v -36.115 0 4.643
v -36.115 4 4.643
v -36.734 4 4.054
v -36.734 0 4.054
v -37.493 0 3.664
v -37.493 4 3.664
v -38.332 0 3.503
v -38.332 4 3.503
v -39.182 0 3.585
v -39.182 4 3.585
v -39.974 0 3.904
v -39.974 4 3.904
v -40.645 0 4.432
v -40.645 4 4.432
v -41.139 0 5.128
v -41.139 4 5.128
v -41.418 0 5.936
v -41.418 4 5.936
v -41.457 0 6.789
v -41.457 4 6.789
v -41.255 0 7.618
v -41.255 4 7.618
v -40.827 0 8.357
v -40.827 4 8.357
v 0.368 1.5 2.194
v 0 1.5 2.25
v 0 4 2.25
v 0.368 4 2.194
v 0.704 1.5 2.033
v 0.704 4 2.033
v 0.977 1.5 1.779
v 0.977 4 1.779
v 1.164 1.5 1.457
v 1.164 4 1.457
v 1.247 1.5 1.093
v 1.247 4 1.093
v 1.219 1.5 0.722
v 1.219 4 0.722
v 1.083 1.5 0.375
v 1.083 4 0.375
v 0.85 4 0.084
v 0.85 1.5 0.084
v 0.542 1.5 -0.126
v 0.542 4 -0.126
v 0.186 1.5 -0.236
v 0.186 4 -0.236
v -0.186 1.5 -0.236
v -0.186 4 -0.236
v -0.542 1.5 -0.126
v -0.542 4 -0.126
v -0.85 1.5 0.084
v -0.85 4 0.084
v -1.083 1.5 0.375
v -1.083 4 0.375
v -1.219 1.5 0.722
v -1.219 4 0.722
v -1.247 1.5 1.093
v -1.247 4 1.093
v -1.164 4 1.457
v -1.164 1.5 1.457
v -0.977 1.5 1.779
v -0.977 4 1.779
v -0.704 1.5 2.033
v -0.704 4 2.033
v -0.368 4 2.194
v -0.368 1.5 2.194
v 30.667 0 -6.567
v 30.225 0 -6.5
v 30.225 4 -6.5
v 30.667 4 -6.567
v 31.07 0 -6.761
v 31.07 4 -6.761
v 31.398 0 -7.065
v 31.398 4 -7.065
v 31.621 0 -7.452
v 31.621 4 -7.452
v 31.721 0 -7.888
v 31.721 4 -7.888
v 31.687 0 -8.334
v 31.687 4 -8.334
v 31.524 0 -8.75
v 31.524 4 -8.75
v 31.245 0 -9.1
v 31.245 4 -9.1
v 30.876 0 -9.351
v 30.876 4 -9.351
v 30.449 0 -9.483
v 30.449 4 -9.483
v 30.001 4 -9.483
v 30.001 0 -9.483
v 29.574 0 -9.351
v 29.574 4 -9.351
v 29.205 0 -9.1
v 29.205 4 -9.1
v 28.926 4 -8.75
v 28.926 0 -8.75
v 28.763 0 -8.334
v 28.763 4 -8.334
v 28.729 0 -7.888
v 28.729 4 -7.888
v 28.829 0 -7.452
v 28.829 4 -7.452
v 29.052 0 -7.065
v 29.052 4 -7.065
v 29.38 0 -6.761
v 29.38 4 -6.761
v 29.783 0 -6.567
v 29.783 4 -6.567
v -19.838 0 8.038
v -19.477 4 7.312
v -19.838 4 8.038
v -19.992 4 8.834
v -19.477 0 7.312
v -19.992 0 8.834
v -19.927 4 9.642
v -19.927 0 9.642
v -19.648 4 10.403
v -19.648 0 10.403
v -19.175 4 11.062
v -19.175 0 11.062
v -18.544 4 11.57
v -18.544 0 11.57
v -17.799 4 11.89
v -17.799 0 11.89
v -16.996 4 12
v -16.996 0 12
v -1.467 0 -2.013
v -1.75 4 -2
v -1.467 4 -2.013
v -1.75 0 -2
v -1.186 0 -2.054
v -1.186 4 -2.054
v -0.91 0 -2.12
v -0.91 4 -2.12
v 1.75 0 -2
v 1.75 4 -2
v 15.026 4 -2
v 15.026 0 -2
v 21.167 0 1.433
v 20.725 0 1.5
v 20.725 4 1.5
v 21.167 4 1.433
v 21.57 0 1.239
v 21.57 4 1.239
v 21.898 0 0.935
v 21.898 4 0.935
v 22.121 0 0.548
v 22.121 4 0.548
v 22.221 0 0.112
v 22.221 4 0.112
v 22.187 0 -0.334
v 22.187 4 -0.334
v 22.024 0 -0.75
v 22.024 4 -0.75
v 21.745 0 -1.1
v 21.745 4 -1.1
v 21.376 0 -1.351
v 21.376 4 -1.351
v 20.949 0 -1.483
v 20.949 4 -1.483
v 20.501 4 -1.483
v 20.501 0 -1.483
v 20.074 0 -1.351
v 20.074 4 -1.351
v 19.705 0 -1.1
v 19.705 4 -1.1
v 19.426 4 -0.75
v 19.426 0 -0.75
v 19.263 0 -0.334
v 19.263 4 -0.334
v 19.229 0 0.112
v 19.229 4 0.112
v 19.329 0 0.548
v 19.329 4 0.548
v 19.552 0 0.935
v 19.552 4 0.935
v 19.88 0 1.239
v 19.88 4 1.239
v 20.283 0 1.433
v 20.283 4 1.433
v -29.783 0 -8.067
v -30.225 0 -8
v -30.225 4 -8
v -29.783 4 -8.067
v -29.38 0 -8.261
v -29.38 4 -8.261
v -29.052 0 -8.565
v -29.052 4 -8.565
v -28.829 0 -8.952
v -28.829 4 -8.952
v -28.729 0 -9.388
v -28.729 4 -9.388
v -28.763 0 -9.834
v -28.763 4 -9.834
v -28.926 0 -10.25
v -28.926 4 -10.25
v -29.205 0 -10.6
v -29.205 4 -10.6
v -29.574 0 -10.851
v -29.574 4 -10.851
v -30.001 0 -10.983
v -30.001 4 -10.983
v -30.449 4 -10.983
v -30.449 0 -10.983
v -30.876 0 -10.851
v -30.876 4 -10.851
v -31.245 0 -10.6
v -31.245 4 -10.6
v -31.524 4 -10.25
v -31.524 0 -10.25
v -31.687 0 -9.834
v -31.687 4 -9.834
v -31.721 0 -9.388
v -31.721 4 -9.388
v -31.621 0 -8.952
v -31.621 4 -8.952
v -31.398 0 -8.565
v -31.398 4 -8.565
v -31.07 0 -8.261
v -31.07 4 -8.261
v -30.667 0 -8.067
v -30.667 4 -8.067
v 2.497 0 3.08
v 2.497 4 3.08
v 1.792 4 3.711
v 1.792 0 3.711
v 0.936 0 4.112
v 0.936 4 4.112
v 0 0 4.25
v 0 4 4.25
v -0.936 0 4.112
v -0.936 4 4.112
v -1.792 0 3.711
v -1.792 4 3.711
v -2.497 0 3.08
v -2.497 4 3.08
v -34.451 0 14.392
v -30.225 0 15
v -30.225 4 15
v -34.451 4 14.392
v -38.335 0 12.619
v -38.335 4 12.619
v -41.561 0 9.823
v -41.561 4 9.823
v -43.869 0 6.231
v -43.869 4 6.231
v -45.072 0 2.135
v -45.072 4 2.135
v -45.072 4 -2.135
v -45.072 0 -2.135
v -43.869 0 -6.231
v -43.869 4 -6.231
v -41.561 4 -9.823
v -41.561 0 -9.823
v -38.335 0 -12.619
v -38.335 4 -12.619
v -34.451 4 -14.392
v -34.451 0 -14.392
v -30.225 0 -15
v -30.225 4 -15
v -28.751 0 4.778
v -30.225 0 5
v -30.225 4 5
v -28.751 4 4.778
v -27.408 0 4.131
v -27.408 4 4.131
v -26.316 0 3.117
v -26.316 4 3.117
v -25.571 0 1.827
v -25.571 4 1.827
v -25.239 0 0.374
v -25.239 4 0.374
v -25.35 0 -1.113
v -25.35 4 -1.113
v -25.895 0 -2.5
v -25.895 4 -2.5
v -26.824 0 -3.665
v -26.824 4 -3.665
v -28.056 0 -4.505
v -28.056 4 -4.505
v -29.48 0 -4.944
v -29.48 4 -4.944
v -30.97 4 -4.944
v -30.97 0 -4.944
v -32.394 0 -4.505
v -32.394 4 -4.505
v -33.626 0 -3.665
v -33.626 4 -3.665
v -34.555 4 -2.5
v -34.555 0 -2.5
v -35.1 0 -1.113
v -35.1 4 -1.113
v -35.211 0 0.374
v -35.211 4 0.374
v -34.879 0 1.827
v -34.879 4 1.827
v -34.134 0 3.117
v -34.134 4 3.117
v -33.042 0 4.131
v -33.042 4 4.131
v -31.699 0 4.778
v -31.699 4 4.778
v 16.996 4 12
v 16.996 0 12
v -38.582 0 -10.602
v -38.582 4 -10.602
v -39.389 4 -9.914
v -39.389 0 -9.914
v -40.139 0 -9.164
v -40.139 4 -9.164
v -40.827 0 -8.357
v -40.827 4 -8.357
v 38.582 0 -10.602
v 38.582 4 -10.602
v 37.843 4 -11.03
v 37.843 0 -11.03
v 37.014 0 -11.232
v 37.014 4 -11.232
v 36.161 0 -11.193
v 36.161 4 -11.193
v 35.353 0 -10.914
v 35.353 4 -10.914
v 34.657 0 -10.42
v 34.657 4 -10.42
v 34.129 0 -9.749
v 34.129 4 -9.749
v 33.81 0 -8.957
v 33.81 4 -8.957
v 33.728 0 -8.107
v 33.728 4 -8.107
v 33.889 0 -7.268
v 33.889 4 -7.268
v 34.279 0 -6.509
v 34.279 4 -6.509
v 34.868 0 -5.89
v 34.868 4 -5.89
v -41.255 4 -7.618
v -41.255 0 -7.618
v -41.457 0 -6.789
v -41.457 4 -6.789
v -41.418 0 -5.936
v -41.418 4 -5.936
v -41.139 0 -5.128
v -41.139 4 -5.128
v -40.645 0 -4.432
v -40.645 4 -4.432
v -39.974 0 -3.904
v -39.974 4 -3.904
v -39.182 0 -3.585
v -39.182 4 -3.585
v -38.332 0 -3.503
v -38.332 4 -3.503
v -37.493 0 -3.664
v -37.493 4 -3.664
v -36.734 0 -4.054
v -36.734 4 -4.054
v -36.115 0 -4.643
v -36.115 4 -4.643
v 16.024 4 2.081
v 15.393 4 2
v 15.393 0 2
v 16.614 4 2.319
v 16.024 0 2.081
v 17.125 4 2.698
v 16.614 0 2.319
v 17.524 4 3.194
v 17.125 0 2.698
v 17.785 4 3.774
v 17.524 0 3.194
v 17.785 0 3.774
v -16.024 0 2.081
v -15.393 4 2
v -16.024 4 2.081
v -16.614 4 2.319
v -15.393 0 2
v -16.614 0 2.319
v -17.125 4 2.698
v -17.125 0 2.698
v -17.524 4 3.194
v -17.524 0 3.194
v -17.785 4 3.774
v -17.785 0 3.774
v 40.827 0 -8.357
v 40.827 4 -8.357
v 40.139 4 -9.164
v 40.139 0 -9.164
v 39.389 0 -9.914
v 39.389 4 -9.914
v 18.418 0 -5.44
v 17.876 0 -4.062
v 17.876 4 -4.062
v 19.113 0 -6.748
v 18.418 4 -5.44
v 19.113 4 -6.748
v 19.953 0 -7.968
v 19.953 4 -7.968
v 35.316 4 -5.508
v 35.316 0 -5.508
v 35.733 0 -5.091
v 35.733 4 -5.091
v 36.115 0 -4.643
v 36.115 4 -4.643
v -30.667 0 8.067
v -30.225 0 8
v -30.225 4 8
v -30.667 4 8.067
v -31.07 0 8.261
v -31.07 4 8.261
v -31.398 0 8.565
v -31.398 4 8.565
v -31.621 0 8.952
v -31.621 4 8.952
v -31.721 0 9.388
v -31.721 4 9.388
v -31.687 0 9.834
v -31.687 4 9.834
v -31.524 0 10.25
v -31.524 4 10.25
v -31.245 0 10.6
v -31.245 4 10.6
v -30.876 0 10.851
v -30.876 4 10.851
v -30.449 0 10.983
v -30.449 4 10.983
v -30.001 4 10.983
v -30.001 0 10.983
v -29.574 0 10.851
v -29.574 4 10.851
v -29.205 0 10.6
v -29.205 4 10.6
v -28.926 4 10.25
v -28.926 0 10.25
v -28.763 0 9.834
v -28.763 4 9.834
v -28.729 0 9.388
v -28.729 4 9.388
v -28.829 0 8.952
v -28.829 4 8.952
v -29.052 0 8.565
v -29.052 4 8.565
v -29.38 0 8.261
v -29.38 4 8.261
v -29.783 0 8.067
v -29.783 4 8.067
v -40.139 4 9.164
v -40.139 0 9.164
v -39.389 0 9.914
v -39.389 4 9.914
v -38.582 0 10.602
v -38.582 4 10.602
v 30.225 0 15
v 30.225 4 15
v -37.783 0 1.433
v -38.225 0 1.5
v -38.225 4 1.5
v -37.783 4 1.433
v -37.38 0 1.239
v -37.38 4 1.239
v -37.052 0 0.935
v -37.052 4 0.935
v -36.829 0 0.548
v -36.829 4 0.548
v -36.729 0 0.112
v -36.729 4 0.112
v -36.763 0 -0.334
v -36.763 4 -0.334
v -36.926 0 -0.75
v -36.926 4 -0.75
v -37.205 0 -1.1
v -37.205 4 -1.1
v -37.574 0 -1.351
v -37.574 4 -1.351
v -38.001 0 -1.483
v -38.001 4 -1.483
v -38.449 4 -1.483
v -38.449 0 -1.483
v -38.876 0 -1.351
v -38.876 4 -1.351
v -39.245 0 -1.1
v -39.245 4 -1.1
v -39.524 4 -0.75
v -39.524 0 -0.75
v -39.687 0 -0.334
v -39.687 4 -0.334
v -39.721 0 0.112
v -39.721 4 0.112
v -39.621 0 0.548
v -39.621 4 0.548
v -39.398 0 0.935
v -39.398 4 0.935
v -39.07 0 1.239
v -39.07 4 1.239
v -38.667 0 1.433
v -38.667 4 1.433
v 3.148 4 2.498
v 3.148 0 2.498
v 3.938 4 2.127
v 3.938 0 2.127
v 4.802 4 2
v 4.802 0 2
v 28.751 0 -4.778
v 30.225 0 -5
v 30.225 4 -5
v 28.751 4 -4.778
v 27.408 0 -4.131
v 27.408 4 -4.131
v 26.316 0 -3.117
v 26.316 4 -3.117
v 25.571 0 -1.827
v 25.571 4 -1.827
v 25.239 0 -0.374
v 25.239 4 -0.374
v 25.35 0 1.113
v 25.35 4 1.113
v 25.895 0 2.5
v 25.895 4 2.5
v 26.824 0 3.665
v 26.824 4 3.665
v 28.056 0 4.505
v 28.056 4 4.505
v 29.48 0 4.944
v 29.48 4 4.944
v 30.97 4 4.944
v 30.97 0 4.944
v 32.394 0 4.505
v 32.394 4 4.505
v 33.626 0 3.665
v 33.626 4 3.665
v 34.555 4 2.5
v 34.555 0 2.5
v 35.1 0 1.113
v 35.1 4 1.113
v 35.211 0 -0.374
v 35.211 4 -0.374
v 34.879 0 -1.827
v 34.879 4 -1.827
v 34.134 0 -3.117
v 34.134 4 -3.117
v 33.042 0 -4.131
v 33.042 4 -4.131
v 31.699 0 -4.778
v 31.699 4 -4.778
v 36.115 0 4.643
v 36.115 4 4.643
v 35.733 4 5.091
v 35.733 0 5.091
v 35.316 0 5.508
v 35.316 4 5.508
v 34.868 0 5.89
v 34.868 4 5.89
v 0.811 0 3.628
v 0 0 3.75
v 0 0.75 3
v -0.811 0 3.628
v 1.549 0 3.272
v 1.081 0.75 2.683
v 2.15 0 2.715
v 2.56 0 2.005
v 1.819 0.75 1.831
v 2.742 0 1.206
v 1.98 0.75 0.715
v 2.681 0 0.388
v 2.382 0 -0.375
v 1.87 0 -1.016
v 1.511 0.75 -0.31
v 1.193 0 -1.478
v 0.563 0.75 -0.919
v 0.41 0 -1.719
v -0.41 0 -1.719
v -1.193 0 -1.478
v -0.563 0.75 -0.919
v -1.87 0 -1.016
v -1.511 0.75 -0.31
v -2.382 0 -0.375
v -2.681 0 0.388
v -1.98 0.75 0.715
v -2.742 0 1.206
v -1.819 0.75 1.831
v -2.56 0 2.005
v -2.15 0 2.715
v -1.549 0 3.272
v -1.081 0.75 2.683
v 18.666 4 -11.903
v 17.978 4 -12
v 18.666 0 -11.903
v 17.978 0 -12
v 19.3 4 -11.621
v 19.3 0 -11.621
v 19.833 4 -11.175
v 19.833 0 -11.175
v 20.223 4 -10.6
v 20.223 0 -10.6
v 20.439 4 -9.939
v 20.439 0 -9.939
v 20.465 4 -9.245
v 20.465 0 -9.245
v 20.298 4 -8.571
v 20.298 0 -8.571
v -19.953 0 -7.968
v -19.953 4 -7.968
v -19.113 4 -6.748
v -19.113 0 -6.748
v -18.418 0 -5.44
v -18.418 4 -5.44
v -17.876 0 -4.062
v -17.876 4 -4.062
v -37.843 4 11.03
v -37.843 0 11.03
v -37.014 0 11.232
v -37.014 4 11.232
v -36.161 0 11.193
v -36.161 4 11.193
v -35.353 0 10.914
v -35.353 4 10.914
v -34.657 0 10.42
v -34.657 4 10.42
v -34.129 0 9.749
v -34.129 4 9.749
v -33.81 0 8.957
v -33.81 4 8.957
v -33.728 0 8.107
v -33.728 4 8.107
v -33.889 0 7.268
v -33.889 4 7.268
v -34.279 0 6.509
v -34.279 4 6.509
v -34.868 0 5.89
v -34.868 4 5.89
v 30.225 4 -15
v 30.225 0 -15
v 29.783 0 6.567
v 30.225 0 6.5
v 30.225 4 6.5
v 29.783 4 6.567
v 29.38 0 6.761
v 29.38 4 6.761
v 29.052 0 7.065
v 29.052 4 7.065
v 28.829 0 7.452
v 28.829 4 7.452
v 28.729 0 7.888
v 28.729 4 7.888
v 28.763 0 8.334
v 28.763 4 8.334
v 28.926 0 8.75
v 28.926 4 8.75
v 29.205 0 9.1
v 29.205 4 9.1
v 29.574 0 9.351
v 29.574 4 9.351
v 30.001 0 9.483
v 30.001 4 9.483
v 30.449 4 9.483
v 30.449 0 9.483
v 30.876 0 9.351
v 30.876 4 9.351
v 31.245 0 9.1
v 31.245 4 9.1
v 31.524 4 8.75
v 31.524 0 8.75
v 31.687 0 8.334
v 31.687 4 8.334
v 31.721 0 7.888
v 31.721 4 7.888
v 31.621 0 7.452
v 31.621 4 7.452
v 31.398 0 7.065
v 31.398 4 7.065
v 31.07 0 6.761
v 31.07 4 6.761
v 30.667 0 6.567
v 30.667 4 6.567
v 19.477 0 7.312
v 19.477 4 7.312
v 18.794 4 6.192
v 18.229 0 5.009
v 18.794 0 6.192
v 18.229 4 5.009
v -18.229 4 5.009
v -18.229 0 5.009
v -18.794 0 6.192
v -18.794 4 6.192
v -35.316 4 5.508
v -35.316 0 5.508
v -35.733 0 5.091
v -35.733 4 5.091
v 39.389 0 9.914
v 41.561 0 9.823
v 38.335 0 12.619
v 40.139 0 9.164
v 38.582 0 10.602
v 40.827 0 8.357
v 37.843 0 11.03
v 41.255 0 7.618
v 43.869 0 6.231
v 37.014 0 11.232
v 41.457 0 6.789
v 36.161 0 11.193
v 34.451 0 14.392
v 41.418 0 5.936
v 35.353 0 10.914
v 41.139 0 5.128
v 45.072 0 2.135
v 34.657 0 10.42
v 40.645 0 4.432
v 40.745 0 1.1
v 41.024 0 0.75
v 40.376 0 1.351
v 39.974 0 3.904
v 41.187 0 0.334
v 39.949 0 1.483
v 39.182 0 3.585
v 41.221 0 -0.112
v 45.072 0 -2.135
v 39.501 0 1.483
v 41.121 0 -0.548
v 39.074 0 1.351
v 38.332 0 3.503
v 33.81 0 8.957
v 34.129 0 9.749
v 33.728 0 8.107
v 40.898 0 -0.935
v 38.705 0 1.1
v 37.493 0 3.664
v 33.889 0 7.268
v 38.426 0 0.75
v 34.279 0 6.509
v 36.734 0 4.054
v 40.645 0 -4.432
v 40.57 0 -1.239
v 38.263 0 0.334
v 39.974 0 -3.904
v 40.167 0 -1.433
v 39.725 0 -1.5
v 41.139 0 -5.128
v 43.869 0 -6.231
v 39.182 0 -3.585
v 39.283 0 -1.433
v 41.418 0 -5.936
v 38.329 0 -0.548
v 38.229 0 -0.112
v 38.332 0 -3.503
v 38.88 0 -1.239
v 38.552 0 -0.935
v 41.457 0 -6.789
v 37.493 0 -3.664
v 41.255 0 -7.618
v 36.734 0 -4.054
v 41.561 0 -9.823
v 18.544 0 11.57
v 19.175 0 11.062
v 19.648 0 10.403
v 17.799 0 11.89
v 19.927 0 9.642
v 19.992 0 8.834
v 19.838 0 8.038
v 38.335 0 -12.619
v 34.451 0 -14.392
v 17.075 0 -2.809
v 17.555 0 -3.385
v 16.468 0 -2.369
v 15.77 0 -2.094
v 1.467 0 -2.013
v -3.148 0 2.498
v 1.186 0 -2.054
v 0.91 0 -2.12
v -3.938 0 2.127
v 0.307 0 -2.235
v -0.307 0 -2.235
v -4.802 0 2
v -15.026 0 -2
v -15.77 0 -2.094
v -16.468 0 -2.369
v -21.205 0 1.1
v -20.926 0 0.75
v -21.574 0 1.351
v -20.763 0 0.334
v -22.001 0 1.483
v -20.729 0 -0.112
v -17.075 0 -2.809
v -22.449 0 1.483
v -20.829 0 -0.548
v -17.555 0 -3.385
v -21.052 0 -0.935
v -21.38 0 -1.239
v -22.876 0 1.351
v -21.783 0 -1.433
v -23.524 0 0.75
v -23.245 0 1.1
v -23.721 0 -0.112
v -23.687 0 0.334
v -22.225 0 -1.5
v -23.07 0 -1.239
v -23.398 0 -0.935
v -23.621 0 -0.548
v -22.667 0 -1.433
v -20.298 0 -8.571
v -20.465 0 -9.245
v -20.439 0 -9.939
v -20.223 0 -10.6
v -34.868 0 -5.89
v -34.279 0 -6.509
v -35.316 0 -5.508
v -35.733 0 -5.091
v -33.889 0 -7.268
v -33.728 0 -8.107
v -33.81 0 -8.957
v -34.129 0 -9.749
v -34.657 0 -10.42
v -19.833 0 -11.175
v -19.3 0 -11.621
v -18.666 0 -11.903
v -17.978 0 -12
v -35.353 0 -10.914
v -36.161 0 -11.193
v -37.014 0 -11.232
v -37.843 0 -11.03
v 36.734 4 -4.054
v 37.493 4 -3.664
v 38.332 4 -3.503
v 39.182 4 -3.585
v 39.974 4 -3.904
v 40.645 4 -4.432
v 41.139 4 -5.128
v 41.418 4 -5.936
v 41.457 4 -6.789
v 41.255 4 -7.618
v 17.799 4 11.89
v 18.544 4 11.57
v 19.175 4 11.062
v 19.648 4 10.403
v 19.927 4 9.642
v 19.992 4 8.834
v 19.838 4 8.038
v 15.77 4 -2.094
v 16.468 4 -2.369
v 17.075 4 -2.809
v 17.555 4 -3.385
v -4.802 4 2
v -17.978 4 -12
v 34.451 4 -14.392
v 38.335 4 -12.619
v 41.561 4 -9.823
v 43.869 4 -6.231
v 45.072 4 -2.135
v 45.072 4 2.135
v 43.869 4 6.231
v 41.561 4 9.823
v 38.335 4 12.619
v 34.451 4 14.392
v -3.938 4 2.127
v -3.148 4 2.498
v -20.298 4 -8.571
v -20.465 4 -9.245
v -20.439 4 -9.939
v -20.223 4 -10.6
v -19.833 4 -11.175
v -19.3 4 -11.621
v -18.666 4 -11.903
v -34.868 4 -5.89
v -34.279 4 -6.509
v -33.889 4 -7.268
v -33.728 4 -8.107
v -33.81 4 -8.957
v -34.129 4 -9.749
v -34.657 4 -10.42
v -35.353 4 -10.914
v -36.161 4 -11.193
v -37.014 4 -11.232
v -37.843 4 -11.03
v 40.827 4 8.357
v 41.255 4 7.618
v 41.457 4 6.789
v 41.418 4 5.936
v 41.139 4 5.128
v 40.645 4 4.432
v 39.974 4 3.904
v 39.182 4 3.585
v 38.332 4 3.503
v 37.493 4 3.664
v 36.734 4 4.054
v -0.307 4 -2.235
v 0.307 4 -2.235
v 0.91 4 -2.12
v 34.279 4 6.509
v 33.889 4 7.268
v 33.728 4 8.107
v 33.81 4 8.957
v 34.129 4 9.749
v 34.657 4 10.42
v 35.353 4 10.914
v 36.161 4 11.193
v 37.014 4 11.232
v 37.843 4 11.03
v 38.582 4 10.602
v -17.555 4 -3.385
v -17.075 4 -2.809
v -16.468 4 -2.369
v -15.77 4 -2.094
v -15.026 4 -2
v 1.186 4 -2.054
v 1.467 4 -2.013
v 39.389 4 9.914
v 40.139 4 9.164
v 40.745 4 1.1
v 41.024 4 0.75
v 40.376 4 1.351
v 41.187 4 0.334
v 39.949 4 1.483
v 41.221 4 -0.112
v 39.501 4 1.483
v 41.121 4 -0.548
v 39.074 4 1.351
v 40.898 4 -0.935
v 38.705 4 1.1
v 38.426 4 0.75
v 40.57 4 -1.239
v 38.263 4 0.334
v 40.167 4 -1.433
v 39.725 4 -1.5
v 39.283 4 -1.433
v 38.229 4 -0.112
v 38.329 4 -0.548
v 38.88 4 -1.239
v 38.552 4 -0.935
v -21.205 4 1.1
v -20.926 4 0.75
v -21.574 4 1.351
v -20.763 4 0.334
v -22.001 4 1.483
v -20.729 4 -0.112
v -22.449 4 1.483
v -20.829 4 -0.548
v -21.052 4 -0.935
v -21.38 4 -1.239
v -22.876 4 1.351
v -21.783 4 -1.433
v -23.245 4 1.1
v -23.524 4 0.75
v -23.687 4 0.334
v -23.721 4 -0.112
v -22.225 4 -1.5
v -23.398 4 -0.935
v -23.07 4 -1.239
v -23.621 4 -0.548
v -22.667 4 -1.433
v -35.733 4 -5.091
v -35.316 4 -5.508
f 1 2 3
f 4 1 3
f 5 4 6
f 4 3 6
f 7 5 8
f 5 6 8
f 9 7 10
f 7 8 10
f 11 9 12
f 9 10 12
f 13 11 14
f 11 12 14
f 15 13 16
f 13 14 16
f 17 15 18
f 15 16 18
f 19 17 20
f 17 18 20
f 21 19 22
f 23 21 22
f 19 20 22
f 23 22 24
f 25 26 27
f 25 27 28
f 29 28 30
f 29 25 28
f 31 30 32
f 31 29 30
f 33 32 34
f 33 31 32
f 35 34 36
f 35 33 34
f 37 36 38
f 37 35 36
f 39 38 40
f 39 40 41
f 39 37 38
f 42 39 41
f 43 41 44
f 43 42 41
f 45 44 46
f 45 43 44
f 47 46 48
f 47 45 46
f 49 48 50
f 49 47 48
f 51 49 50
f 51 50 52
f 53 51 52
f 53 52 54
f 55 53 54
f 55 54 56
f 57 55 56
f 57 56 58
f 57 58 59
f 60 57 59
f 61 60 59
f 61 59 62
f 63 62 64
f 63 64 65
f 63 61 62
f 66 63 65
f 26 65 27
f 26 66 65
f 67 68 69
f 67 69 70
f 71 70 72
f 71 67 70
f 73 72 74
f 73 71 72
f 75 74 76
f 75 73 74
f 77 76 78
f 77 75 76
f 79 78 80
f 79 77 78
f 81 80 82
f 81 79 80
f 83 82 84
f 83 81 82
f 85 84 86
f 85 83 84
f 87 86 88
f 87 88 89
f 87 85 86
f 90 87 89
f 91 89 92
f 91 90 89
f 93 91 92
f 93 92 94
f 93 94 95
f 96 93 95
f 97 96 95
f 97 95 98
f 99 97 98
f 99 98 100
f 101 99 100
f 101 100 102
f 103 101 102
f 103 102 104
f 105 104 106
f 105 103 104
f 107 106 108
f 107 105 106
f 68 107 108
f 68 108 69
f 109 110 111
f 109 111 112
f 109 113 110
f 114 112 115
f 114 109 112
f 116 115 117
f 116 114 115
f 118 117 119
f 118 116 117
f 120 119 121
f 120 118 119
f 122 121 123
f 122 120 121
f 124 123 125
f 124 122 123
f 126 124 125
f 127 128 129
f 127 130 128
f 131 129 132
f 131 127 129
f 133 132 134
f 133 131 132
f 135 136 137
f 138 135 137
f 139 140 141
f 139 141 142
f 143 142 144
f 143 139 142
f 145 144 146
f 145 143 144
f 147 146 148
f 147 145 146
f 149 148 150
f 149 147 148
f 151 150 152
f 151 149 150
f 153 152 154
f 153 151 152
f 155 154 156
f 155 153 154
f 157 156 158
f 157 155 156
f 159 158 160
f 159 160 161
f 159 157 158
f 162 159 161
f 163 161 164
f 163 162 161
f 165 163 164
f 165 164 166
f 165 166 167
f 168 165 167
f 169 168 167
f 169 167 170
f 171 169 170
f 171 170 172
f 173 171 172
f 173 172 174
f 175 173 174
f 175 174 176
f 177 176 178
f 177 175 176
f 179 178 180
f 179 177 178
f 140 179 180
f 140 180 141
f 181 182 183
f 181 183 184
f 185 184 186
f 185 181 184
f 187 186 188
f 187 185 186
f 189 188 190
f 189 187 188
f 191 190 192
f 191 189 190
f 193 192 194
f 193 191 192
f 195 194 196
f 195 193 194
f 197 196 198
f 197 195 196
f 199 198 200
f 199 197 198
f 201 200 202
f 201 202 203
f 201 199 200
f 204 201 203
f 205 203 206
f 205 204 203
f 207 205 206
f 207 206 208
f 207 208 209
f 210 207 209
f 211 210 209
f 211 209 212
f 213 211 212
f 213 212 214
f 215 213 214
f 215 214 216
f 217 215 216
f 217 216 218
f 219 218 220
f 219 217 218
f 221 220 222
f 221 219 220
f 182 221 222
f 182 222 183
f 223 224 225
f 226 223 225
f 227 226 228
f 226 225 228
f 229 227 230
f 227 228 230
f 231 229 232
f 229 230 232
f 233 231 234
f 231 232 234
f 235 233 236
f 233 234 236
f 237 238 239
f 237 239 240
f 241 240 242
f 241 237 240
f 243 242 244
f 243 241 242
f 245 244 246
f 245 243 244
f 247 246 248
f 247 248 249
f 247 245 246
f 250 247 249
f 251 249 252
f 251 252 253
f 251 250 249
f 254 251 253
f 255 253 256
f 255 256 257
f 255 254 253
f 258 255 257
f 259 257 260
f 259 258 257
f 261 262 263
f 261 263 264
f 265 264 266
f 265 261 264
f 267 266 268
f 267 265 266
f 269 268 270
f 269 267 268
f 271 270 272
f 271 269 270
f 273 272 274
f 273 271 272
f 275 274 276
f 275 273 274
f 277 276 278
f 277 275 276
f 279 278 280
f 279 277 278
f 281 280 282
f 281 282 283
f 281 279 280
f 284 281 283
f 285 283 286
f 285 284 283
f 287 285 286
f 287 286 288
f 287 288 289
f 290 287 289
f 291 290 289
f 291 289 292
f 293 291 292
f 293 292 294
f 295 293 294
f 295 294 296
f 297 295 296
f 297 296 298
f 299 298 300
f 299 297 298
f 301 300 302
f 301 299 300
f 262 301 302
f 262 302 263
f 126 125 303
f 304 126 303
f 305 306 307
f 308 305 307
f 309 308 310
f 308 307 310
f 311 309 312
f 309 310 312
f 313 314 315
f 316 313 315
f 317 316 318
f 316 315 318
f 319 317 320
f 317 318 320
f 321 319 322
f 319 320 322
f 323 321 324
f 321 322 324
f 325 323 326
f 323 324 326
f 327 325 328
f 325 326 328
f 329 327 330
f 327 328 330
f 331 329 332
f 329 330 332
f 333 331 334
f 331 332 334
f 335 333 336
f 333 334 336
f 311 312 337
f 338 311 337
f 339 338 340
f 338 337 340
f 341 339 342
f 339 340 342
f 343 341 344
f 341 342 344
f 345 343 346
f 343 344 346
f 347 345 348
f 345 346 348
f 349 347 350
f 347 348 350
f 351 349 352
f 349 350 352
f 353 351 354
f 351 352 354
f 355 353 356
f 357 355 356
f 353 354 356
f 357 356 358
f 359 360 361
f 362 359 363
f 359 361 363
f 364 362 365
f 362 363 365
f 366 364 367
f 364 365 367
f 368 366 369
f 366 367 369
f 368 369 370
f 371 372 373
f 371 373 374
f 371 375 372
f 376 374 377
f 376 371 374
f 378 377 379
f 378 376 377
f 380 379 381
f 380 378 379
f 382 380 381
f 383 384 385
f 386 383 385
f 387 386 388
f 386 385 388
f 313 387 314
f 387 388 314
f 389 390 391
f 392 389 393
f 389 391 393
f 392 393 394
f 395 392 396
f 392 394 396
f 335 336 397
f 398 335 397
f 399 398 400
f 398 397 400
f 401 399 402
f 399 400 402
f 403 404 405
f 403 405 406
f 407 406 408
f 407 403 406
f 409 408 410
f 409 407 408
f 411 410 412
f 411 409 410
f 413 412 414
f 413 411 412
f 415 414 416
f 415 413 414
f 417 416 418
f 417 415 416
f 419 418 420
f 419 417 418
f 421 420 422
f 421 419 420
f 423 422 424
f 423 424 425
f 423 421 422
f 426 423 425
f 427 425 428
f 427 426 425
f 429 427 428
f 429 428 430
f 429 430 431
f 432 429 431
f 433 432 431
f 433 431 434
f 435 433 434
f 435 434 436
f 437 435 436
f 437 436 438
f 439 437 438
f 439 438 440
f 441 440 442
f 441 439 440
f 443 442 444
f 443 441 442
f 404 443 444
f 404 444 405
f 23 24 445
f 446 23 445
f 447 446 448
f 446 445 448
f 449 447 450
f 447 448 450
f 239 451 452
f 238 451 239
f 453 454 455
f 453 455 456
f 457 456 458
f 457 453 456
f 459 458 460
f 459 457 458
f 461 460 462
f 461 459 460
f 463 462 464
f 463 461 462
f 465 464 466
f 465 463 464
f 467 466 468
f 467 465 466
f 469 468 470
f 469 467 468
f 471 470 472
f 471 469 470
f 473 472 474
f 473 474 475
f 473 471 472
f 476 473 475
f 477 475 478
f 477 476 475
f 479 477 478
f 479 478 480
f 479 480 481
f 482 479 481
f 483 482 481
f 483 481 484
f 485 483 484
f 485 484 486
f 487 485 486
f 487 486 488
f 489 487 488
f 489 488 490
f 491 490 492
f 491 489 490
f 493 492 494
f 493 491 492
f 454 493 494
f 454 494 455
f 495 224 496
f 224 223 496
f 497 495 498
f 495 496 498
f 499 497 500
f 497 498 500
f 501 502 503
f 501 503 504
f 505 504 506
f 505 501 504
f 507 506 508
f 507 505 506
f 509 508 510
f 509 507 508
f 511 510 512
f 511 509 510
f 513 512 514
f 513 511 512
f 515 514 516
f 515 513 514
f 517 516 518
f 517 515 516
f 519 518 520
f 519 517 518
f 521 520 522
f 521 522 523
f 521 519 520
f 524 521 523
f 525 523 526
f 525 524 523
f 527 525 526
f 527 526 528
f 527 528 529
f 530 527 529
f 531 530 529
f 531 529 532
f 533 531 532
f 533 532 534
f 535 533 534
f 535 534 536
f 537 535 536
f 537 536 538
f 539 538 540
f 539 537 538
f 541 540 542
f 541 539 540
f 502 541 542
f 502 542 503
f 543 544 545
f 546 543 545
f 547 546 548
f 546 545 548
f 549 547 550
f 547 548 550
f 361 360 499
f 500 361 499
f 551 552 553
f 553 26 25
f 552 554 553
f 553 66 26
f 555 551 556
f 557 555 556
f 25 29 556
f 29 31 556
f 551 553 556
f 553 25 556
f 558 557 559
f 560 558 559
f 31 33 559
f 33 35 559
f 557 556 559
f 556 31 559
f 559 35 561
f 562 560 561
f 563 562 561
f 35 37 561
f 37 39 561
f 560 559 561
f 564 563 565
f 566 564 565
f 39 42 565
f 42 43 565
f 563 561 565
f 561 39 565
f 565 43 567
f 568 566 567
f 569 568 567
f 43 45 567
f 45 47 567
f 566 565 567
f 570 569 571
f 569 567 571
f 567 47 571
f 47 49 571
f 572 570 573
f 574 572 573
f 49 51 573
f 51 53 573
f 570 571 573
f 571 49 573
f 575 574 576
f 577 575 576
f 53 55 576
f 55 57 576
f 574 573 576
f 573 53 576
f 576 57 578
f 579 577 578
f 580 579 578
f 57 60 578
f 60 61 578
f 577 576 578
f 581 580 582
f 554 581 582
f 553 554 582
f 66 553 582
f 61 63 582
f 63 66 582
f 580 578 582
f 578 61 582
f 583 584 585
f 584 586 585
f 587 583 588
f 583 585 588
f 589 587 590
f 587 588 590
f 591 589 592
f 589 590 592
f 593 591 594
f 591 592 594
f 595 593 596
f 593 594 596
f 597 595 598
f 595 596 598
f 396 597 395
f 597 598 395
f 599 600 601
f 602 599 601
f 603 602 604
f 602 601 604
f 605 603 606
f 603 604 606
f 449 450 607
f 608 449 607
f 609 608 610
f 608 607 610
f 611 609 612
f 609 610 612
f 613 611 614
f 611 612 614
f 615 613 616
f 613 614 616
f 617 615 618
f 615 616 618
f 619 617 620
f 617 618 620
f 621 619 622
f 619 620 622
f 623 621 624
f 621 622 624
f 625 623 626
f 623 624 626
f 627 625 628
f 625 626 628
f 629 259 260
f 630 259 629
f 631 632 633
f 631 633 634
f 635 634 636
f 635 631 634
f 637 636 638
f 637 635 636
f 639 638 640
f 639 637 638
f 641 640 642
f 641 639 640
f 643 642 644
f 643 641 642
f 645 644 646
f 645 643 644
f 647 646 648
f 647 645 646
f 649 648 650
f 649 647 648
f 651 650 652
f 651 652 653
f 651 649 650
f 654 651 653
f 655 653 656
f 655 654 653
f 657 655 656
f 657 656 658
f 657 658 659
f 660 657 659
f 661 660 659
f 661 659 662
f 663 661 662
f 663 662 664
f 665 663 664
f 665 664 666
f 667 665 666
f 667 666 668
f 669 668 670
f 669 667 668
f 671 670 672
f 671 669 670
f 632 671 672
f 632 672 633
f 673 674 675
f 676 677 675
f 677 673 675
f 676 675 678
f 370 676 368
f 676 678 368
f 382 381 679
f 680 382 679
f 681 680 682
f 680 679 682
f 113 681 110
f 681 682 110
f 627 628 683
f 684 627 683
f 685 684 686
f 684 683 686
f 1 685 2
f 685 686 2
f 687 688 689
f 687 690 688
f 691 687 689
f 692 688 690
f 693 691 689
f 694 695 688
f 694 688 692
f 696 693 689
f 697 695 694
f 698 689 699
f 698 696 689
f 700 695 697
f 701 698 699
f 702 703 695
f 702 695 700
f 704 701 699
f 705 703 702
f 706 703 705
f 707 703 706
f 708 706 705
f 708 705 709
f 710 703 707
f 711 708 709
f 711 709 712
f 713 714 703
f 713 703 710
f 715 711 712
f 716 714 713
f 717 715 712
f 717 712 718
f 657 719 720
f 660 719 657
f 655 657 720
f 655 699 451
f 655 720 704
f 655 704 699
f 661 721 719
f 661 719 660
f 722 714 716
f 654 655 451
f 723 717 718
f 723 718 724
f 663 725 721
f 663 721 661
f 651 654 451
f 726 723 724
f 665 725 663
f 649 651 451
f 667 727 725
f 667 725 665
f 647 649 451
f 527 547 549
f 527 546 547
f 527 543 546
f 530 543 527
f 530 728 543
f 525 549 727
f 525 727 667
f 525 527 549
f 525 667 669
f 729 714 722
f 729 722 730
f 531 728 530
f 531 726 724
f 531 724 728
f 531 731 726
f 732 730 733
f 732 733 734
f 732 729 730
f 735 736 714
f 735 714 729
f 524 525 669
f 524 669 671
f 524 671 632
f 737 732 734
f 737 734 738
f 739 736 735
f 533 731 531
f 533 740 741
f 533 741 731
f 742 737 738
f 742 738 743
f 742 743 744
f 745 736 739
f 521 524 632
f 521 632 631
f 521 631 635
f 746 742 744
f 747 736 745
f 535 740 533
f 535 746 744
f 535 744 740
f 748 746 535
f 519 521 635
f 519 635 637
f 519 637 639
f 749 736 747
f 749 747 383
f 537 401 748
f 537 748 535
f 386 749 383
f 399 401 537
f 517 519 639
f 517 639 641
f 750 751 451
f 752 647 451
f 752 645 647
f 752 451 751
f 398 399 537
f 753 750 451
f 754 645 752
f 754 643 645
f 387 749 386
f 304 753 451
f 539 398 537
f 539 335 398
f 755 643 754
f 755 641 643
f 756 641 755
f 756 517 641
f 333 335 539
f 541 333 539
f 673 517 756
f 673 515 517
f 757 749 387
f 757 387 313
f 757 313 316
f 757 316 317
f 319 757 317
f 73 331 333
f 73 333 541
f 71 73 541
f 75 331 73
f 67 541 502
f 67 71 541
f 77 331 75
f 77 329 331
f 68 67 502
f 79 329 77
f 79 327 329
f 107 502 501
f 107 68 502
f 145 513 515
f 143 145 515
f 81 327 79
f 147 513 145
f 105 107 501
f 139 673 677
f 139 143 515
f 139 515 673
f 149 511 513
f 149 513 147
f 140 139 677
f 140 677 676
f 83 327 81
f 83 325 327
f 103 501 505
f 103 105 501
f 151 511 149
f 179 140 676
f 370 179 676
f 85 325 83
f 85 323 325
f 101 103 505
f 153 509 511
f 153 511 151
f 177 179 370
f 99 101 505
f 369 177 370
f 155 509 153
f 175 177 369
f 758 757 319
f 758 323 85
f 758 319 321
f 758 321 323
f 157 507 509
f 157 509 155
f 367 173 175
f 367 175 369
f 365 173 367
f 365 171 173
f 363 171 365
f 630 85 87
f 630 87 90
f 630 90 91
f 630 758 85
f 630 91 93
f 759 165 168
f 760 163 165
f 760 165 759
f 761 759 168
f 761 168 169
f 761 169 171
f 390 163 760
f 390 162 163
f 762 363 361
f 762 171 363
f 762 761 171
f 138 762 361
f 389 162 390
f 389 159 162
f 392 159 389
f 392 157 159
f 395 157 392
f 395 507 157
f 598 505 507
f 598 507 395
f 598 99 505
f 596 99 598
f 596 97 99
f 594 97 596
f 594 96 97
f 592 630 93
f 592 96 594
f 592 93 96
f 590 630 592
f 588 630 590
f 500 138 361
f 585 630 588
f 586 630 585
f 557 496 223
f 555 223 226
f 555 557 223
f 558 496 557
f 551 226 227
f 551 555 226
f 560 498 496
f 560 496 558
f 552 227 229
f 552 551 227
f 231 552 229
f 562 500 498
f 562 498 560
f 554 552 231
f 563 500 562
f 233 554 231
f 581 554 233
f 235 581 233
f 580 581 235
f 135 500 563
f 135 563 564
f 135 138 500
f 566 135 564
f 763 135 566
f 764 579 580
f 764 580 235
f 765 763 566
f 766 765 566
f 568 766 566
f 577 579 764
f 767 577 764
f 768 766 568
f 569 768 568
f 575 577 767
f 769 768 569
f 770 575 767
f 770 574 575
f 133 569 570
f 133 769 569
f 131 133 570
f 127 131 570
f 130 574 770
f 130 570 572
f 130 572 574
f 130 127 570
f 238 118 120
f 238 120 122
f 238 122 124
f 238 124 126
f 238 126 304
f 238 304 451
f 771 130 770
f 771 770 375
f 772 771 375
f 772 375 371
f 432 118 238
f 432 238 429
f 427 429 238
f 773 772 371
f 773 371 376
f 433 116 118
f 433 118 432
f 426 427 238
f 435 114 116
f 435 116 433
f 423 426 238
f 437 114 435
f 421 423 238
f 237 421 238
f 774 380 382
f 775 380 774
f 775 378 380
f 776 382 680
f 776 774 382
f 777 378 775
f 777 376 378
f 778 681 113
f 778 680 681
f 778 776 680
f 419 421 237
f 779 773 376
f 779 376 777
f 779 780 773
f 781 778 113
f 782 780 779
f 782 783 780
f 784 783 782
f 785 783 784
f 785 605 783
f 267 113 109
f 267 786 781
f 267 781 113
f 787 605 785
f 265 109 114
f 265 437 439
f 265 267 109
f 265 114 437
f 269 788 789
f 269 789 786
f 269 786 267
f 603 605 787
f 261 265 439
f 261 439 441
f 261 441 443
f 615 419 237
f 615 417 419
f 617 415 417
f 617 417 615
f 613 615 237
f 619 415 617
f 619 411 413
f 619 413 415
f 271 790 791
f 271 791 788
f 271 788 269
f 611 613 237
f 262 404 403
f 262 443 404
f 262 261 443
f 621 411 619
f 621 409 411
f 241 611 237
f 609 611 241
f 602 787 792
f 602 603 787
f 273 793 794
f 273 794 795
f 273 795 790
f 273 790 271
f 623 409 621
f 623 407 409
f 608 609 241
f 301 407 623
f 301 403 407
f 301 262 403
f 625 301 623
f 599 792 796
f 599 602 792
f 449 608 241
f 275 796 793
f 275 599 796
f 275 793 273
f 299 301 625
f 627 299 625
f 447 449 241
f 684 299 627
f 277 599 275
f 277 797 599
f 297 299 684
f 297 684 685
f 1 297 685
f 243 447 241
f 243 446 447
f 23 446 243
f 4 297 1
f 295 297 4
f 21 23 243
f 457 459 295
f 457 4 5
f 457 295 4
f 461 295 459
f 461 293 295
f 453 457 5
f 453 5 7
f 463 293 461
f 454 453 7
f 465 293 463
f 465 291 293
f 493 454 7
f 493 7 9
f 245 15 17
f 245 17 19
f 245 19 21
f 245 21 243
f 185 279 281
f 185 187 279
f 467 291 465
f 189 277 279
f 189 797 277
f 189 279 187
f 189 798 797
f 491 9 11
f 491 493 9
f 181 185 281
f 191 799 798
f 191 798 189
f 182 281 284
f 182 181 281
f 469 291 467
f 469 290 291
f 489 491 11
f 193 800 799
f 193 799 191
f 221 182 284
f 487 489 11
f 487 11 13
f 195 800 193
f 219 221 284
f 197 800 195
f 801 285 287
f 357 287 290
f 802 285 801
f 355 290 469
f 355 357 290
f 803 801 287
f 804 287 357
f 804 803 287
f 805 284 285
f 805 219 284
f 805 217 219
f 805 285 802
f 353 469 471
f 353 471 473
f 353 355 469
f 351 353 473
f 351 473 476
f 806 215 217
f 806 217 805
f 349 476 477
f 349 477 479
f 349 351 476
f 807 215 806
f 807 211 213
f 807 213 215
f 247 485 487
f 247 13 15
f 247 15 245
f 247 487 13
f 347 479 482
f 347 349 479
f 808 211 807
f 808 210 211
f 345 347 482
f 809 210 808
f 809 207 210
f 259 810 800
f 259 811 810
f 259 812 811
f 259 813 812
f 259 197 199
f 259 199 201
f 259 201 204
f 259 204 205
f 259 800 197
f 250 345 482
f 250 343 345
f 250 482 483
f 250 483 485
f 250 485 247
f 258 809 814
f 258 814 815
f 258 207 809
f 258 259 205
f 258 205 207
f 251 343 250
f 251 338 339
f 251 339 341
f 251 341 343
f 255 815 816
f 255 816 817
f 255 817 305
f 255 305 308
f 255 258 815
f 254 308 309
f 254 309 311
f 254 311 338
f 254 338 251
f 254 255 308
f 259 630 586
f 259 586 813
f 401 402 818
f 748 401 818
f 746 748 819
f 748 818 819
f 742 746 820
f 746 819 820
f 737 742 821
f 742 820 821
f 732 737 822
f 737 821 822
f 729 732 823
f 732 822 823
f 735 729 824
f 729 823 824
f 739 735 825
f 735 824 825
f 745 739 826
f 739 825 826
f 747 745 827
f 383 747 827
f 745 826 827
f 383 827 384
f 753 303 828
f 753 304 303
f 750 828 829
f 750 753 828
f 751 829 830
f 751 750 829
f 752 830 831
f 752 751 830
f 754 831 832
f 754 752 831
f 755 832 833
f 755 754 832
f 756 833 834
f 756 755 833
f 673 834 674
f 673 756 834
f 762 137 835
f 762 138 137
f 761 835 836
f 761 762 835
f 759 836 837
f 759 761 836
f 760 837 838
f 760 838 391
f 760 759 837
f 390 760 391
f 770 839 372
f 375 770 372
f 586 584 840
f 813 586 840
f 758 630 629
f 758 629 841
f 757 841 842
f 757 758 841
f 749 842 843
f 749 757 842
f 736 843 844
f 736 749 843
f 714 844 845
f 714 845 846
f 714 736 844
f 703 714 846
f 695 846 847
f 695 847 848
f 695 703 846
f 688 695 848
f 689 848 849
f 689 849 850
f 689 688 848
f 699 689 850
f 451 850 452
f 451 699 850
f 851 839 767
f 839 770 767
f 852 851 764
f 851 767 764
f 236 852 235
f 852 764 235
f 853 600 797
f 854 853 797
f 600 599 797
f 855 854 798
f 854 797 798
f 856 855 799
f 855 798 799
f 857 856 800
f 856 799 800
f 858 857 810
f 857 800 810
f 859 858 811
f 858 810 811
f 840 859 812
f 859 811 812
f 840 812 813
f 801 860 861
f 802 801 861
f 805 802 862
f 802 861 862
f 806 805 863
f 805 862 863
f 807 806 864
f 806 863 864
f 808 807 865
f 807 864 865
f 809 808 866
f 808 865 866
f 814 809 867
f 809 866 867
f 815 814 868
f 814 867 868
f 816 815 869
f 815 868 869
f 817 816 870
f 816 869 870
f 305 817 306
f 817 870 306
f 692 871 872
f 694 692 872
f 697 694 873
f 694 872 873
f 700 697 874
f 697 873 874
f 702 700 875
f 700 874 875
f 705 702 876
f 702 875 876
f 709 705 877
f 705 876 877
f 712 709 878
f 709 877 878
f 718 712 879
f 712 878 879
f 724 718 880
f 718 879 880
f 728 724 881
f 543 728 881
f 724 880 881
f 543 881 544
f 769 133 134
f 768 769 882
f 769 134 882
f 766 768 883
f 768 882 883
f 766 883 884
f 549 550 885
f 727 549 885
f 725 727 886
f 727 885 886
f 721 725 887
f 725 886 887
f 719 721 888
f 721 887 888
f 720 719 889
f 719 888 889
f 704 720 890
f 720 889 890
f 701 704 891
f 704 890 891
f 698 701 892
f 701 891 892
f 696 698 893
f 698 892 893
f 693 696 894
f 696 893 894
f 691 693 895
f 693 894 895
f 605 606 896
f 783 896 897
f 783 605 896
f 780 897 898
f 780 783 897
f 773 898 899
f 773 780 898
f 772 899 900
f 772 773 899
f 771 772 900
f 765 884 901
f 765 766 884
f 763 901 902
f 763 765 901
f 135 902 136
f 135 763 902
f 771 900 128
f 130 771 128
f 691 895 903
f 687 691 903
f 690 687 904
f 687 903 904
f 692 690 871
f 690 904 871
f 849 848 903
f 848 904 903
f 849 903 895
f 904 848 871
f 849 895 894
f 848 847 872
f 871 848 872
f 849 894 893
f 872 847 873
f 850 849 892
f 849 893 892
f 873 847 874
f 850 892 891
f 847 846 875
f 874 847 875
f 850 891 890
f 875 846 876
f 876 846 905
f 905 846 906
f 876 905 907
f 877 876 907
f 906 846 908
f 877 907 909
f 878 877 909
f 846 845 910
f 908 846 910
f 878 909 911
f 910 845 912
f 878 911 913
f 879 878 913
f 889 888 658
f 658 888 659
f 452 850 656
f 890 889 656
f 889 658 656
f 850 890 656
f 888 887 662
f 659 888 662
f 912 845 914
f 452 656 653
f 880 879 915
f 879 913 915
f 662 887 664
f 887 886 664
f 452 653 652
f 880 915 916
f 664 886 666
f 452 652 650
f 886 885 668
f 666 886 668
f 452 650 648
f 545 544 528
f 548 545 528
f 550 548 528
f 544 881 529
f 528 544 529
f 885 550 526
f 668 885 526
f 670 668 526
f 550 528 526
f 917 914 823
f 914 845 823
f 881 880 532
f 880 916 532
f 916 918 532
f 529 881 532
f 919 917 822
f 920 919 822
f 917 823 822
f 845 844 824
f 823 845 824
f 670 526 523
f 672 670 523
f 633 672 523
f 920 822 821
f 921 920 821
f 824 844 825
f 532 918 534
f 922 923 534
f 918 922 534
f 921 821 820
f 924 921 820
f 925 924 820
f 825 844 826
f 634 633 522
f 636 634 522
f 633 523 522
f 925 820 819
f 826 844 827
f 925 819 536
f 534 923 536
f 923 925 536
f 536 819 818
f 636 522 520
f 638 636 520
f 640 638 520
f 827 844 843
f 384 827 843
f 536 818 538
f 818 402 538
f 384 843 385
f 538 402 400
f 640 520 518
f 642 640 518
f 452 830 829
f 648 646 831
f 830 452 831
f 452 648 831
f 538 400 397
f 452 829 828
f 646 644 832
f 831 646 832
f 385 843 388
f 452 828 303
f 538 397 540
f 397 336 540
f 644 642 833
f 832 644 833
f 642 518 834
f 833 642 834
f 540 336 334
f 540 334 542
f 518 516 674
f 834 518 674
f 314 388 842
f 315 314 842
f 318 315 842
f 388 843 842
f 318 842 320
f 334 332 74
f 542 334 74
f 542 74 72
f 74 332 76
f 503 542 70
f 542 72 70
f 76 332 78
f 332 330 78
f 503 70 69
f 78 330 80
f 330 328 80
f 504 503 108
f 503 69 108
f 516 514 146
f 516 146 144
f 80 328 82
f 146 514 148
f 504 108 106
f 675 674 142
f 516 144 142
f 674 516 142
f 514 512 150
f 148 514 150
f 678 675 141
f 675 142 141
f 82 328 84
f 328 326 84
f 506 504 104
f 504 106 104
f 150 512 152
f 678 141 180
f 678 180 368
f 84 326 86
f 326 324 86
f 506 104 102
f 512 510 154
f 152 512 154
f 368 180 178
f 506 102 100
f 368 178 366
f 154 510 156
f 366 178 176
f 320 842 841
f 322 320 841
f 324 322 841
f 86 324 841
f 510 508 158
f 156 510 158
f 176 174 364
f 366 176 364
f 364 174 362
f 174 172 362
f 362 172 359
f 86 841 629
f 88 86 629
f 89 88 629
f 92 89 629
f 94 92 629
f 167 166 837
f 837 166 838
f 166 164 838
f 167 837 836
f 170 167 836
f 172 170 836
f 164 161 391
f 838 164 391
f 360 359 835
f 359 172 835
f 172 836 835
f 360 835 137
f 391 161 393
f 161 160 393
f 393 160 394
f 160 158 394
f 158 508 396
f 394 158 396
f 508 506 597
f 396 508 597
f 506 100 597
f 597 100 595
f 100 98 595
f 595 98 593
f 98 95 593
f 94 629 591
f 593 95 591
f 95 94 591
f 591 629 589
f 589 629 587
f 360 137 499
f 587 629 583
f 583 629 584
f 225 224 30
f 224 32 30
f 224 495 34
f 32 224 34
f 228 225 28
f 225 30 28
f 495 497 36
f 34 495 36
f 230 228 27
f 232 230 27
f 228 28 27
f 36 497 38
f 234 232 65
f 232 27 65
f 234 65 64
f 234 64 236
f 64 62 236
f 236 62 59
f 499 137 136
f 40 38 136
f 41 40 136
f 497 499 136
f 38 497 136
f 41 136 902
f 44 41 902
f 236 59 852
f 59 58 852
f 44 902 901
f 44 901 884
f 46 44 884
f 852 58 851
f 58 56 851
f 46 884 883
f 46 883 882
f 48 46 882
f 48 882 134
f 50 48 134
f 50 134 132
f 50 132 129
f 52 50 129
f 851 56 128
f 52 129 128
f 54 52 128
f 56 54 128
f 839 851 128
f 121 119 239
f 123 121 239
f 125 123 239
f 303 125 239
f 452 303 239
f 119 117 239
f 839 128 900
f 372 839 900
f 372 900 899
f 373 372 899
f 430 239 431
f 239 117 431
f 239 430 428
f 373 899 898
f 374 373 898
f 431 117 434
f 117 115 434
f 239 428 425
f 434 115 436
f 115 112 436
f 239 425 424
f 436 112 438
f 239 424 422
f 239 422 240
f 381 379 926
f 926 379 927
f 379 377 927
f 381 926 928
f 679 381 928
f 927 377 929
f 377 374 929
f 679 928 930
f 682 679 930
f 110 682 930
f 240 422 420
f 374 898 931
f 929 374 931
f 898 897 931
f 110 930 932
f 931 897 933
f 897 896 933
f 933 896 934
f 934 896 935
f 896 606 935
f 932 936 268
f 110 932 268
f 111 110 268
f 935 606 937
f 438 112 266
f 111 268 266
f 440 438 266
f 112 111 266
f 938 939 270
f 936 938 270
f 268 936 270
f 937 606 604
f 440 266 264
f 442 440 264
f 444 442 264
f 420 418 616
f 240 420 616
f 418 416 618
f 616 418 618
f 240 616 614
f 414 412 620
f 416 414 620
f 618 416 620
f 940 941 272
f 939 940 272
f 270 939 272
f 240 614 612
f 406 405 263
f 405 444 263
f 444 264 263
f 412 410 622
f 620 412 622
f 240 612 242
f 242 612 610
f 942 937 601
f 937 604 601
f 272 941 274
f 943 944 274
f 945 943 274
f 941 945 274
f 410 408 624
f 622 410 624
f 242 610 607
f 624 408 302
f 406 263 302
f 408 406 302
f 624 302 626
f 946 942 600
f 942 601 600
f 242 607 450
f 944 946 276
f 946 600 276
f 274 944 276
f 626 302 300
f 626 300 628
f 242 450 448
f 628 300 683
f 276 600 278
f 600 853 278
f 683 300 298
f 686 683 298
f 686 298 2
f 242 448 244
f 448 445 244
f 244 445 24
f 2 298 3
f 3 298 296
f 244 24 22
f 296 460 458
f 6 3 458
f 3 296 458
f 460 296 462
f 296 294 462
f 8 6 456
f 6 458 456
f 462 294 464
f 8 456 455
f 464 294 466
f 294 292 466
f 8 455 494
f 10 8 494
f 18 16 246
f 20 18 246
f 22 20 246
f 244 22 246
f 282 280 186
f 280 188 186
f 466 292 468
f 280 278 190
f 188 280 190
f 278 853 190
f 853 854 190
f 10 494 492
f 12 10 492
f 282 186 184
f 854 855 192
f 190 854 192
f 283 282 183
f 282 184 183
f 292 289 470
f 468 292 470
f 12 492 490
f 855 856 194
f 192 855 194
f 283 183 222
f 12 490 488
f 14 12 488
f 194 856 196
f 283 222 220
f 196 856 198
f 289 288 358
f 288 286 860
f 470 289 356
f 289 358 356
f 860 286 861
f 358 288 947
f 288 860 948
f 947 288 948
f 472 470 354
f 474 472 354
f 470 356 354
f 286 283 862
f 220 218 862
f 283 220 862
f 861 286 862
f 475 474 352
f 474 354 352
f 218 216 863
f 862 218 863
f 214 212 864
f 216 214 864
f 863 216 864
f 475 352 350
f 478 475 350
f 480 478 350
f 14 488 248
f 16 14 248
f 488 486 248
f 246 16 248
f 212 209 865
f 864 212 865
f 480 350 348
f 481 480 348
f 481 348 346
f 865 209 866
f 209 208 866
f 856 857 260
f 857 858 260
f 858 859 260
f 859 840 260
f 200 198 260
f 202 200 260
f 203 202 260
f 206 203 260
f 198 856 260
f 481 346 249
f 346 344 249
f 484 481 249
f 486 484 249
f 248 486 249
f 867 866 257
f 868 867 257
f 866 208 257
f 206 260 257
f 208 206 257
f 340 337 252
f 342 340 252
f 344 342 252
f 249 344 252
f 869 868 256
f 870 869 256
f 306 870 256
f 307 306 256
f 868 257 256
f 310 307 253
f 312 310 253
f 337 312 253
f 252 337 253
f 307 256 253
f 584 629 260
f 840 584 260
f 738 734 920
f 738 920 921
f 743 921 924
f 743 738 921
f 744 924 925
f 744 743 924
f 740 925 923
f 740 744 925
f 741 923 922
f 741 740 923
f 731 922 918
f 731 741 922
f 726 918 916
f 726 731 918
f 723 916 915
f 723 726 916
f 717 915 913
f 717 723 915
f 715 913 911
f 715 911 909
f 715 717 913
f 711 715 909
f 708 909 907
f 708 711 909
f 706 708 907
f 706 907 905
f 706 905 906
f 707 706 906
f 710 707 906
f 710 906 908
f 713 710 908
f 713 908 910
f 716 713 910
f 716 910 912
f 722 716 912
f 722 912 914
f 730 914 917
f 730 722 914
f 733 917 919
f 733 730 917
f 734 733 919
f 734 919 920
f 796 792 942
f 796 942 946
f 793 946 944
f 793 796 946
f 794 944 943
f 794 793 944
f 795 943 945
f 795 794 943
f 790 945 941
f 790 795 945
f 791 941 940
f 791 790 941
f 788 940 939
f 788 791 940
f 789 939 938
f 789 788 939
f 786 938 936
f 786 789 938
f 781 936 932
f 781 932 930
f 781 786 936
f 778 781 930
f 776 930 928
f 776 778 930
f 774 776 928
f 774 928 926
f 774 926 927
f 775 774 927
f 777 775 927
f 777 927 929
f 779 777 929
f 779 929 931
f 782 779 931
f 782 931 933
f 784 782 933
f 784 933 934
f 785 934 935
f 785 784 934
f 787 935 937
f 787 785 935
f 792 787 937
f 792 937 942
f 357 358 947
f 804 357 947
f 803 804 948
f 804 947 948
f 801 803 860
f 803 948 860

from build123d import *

# Parameters (mm, degrees)
SKETCH_1_R          = 5
SKETCH_1_R_2        = 1.5
SKETCH_1_R_3        = 1.25
EXTRUDE_1_DEPTH     = 4
CUT_EXTRUDE_1_DEPTH = 10
FILLET_1_R          = 2.5
FILLET_2_R          = 3
CUT_EXTRUDE_2_DEPTH = 10
CHAMFER_1_SIZE      = 1.5


with BuildPart() as part:
    # 草图1 → 凸台-拉伸1 (new body)
    with BuildSketch(Plane(origin=(0, 0, 0), x_dir=(1, 0, 0), z_dir=(0, 1, 0))):
        with BuildLine():
            Line((-30.225, 15), (30.225, 15))
            ThreePointArc((30.225, 15), (45.225, 0), (30.225, -15))
            Line((30.225, -15), (-30.225, -15))
            ThreePointArc((-30.225, -15), (-45.225, 0), (-30.225, 15))
        make_face()
        with Locations(Location((-30.225, 0, 0), (0, 0, 270))):
            Circle(SKETCH_1_R, mode=Mode.SUBTRACT)
        with Locations(Location((30.225, 0, 0), (0, 0, 90))):
            Circle(SKETCH_1_R, mode=Mode.SUBTRACT)
        with Locations(Location((-30.225, 9.5, 0), (0, 0, 270))):
            Circle(SKETCH_1_R_2, mode=Mode.SUBTRACT)
        with Locations(Location((-30.225, -9.5, 0), (0, 0, 90))):
            Circle(SKETCH_1_R_2, mode=Mode.SUBTRACT)
        with Locations(Location((-38.225, 0, 0), (0, 0, 270))):
            Circle(SKETCH_1_R_2, mode=Mode.SUBTRACT)
        with Locations(Location((-22.225, 0, 0), (0, 0, 90))):
            Circle(SKETCH_1_R_2, mode=Mode.SUBTRACT)
        with Locations(Location((30.225, 8, 0), (0, 0, 270))):
            Circle(SKETCH_1_R_2, mode=Mode.SUBTRACT)
        with Locations(Location((20.725, 0, 0), (0, 0, 270))):
            Circle(SKETCH_1_R_2, mode=Mode.SUBTRACT)
        with Locations(Location((39.725, 0, 0), (0, 0, 90))):
            Circle(SKETCH_1_R_2, mode=Mode.SUBTRACT)
        with Locations(Location((30.225, -8, 0), (0, 0, 90))):
            Circle(SKETCH_1_R_2, mode=Mode.SUBTRACT)
        with Locations(Location((0, -1, 0), (0, 0, 270))):
            Circle(SKETCH_1_R_3, mode=Mode.SUBTRACT)
    extrude(amount=EXTRUDE_1_DEPTH)

    # 草图2 → 切除-拉伸1 (cut)
    with BuildSketch(Plane(origin=(0, 4, 0), x_dir=(1, 0, 0), z_dir=(0, 1, 0))):
        with BuildLine():
            Line((-3.092329219, -2), (-17.379767421, -2))
            ThreePointArc((-17.379767421, -2), (-19.996946351, -8.02414597), (-25.225, -12))
            Line((-25.225, -12), (25.225, -12))
            ThreePointArc((25.225, -12), (19.996946351, -8.02414597), (17.379767421, -2))
            Line((17.379767421, -2), (3.092329219, -2))
            ThreePointArc((3.092329219, -2), (0, -4.25), (-3.092329219, -2))
        make_face()
        with BuildLine():
            Line((-17.379767421, 2), (-1.25, 2))
            ThreePointArc((-1.25, 2), (0, 2.25), (1.25, 2))
            Line((1.25, 2), (17.379767421, 2))
            ThreePointArc((17.379767421, 2), (19.996946351, 8.02414597), (25.225, 12))
            Line((25.225, 12), (-25.225, 12))
            ThreePointArc((-25.225, 12), (-19.996946351, 8.02414597), (-17.379767421, 2))
        make_face()
    extrude(amount=-CUT_EXTRUDE_1_DEPTH, mode=Mode.SUBTRACT)

    # 圆角1
    fillet_1_edges = [part.edges().sort_by_distance(p)[0] for p in [
        (-25.225, 2, -12),
        (25.225, 2, -12),
        (17.379767421, 2, 2),
        (-17.379767421, 2, 2),
    ]]
    fillet(fillet_1_edges, radius=FILLET_1_R)

    # 圆角2
    fillet_2_edges = [part.edges().sort_by_distance(p)[0] for p in [
        (1.25, 2, -2),
        (-1.25, 2, -2),
        (-17.379767421, 2, -2),
        (17.379767421, 2, -2),
        (-3.092329219, 2, 2),
        (3.092329219, 2, 2),
        (25.225, 2, 12),
        (-25.225, 2, 12),
    ]]
    fillet(fillet_2_edges, radius=FILLET_2_R)

    # 草图3 → 切除-拉伸2 (cut)
    with BuildSketch(Plane(origin=(0, 4, 0), x_dir=(1, 0, 0), z_dir=(0, 1, 0))):
        with BuildLine():
            ThreePointArc((-34.867857143, 5.890150894), (-34.368939643, 10.103354108), (-38.582142857, 10.602271609))
            ThreePointArc((-38.582142857, 10.602271609), (-39.770941546, 9.545941546), (-40.827271609, 8.357142857))
            ThreePointArc((-40.827271609, 8.357142857), (-40.328354108, 4.143939643), (-36.115150894, 4.642857143))
            ThreePointArc((-36.115150894, 4.642857143), (-35.528300859, 5.303300859), (-34.867857143, 5.890150894))
        make_face()
        with BuildLine():
            ThreePointArc((-40.827271609, -8.357142857), (-39.770941546, -9.545941546), (-38.582142857, -10.602271609))
            ThreePointArc((-38.582142857, -10.602271609), (-34.368939643, -10.103354108), (-34.867857143, -5.890150894))
            ThreePointArc((-34.867857143, -5.890150894), (-35.528300859, -5.303300859), (-36.115150894, -4.642857143))
            ThreePointArc((-36.115150894, -4.642857143), (-40.328354108, -4.143939643), (-40.827271609, -8.357142857))
        make_face()
        with BuildLine():
            ThreePointArc((38.582142857, -10.602271609), (39.770941546, -9.545941546), (40.827271609, -8.357142857))
            ThreePointArc((40.827271609, -8.357142857), (40.328354108, -4.143939643), (36.115150894, -4.642857143))
            ThreePointArc((36.115150894, -4.642857143), (35.528300859, -5.303300859), (34.867857143, -5.890150894))
            ThreePointArc((34.867857143, -5.890150894), (34.368939643, -10.103354108), (38.582142857, -10.602271609))
        make_face()
        with BuildLine():
            ThreePointArc((40.827271609, 8.357142857), (39.770941546, 9.545941546), (38.582142857, 10.602271609))
            ThreePointArc((38.582142857, 10.602271609), (34.368939643, 10.103354108), (34.867857143, 5.890150894))
            ThreePointArc((34.867857143, 5.890150894), (35.528300859, 5.303300859), (36.115150894, 4.642857143))
            ThreePointArc((36.115150894, 4.642857143), (40.328354108, 4.143939643), (40.827271609, 8.357142857))
        make_face()
    extrude(amount=-CUT_EXTRUDE_2_DEPTH, mode=Mode.SUBTRACT)

    # 倒角1
    chamfer_1_edges = [part.edges().sort_by_distance(p)[0] for p in [
        (0, 0, -0.25),
    ]]
    chamfer(chamfer_1_edges, length=CHAMFER_1_SIZE)


solid = part.part
